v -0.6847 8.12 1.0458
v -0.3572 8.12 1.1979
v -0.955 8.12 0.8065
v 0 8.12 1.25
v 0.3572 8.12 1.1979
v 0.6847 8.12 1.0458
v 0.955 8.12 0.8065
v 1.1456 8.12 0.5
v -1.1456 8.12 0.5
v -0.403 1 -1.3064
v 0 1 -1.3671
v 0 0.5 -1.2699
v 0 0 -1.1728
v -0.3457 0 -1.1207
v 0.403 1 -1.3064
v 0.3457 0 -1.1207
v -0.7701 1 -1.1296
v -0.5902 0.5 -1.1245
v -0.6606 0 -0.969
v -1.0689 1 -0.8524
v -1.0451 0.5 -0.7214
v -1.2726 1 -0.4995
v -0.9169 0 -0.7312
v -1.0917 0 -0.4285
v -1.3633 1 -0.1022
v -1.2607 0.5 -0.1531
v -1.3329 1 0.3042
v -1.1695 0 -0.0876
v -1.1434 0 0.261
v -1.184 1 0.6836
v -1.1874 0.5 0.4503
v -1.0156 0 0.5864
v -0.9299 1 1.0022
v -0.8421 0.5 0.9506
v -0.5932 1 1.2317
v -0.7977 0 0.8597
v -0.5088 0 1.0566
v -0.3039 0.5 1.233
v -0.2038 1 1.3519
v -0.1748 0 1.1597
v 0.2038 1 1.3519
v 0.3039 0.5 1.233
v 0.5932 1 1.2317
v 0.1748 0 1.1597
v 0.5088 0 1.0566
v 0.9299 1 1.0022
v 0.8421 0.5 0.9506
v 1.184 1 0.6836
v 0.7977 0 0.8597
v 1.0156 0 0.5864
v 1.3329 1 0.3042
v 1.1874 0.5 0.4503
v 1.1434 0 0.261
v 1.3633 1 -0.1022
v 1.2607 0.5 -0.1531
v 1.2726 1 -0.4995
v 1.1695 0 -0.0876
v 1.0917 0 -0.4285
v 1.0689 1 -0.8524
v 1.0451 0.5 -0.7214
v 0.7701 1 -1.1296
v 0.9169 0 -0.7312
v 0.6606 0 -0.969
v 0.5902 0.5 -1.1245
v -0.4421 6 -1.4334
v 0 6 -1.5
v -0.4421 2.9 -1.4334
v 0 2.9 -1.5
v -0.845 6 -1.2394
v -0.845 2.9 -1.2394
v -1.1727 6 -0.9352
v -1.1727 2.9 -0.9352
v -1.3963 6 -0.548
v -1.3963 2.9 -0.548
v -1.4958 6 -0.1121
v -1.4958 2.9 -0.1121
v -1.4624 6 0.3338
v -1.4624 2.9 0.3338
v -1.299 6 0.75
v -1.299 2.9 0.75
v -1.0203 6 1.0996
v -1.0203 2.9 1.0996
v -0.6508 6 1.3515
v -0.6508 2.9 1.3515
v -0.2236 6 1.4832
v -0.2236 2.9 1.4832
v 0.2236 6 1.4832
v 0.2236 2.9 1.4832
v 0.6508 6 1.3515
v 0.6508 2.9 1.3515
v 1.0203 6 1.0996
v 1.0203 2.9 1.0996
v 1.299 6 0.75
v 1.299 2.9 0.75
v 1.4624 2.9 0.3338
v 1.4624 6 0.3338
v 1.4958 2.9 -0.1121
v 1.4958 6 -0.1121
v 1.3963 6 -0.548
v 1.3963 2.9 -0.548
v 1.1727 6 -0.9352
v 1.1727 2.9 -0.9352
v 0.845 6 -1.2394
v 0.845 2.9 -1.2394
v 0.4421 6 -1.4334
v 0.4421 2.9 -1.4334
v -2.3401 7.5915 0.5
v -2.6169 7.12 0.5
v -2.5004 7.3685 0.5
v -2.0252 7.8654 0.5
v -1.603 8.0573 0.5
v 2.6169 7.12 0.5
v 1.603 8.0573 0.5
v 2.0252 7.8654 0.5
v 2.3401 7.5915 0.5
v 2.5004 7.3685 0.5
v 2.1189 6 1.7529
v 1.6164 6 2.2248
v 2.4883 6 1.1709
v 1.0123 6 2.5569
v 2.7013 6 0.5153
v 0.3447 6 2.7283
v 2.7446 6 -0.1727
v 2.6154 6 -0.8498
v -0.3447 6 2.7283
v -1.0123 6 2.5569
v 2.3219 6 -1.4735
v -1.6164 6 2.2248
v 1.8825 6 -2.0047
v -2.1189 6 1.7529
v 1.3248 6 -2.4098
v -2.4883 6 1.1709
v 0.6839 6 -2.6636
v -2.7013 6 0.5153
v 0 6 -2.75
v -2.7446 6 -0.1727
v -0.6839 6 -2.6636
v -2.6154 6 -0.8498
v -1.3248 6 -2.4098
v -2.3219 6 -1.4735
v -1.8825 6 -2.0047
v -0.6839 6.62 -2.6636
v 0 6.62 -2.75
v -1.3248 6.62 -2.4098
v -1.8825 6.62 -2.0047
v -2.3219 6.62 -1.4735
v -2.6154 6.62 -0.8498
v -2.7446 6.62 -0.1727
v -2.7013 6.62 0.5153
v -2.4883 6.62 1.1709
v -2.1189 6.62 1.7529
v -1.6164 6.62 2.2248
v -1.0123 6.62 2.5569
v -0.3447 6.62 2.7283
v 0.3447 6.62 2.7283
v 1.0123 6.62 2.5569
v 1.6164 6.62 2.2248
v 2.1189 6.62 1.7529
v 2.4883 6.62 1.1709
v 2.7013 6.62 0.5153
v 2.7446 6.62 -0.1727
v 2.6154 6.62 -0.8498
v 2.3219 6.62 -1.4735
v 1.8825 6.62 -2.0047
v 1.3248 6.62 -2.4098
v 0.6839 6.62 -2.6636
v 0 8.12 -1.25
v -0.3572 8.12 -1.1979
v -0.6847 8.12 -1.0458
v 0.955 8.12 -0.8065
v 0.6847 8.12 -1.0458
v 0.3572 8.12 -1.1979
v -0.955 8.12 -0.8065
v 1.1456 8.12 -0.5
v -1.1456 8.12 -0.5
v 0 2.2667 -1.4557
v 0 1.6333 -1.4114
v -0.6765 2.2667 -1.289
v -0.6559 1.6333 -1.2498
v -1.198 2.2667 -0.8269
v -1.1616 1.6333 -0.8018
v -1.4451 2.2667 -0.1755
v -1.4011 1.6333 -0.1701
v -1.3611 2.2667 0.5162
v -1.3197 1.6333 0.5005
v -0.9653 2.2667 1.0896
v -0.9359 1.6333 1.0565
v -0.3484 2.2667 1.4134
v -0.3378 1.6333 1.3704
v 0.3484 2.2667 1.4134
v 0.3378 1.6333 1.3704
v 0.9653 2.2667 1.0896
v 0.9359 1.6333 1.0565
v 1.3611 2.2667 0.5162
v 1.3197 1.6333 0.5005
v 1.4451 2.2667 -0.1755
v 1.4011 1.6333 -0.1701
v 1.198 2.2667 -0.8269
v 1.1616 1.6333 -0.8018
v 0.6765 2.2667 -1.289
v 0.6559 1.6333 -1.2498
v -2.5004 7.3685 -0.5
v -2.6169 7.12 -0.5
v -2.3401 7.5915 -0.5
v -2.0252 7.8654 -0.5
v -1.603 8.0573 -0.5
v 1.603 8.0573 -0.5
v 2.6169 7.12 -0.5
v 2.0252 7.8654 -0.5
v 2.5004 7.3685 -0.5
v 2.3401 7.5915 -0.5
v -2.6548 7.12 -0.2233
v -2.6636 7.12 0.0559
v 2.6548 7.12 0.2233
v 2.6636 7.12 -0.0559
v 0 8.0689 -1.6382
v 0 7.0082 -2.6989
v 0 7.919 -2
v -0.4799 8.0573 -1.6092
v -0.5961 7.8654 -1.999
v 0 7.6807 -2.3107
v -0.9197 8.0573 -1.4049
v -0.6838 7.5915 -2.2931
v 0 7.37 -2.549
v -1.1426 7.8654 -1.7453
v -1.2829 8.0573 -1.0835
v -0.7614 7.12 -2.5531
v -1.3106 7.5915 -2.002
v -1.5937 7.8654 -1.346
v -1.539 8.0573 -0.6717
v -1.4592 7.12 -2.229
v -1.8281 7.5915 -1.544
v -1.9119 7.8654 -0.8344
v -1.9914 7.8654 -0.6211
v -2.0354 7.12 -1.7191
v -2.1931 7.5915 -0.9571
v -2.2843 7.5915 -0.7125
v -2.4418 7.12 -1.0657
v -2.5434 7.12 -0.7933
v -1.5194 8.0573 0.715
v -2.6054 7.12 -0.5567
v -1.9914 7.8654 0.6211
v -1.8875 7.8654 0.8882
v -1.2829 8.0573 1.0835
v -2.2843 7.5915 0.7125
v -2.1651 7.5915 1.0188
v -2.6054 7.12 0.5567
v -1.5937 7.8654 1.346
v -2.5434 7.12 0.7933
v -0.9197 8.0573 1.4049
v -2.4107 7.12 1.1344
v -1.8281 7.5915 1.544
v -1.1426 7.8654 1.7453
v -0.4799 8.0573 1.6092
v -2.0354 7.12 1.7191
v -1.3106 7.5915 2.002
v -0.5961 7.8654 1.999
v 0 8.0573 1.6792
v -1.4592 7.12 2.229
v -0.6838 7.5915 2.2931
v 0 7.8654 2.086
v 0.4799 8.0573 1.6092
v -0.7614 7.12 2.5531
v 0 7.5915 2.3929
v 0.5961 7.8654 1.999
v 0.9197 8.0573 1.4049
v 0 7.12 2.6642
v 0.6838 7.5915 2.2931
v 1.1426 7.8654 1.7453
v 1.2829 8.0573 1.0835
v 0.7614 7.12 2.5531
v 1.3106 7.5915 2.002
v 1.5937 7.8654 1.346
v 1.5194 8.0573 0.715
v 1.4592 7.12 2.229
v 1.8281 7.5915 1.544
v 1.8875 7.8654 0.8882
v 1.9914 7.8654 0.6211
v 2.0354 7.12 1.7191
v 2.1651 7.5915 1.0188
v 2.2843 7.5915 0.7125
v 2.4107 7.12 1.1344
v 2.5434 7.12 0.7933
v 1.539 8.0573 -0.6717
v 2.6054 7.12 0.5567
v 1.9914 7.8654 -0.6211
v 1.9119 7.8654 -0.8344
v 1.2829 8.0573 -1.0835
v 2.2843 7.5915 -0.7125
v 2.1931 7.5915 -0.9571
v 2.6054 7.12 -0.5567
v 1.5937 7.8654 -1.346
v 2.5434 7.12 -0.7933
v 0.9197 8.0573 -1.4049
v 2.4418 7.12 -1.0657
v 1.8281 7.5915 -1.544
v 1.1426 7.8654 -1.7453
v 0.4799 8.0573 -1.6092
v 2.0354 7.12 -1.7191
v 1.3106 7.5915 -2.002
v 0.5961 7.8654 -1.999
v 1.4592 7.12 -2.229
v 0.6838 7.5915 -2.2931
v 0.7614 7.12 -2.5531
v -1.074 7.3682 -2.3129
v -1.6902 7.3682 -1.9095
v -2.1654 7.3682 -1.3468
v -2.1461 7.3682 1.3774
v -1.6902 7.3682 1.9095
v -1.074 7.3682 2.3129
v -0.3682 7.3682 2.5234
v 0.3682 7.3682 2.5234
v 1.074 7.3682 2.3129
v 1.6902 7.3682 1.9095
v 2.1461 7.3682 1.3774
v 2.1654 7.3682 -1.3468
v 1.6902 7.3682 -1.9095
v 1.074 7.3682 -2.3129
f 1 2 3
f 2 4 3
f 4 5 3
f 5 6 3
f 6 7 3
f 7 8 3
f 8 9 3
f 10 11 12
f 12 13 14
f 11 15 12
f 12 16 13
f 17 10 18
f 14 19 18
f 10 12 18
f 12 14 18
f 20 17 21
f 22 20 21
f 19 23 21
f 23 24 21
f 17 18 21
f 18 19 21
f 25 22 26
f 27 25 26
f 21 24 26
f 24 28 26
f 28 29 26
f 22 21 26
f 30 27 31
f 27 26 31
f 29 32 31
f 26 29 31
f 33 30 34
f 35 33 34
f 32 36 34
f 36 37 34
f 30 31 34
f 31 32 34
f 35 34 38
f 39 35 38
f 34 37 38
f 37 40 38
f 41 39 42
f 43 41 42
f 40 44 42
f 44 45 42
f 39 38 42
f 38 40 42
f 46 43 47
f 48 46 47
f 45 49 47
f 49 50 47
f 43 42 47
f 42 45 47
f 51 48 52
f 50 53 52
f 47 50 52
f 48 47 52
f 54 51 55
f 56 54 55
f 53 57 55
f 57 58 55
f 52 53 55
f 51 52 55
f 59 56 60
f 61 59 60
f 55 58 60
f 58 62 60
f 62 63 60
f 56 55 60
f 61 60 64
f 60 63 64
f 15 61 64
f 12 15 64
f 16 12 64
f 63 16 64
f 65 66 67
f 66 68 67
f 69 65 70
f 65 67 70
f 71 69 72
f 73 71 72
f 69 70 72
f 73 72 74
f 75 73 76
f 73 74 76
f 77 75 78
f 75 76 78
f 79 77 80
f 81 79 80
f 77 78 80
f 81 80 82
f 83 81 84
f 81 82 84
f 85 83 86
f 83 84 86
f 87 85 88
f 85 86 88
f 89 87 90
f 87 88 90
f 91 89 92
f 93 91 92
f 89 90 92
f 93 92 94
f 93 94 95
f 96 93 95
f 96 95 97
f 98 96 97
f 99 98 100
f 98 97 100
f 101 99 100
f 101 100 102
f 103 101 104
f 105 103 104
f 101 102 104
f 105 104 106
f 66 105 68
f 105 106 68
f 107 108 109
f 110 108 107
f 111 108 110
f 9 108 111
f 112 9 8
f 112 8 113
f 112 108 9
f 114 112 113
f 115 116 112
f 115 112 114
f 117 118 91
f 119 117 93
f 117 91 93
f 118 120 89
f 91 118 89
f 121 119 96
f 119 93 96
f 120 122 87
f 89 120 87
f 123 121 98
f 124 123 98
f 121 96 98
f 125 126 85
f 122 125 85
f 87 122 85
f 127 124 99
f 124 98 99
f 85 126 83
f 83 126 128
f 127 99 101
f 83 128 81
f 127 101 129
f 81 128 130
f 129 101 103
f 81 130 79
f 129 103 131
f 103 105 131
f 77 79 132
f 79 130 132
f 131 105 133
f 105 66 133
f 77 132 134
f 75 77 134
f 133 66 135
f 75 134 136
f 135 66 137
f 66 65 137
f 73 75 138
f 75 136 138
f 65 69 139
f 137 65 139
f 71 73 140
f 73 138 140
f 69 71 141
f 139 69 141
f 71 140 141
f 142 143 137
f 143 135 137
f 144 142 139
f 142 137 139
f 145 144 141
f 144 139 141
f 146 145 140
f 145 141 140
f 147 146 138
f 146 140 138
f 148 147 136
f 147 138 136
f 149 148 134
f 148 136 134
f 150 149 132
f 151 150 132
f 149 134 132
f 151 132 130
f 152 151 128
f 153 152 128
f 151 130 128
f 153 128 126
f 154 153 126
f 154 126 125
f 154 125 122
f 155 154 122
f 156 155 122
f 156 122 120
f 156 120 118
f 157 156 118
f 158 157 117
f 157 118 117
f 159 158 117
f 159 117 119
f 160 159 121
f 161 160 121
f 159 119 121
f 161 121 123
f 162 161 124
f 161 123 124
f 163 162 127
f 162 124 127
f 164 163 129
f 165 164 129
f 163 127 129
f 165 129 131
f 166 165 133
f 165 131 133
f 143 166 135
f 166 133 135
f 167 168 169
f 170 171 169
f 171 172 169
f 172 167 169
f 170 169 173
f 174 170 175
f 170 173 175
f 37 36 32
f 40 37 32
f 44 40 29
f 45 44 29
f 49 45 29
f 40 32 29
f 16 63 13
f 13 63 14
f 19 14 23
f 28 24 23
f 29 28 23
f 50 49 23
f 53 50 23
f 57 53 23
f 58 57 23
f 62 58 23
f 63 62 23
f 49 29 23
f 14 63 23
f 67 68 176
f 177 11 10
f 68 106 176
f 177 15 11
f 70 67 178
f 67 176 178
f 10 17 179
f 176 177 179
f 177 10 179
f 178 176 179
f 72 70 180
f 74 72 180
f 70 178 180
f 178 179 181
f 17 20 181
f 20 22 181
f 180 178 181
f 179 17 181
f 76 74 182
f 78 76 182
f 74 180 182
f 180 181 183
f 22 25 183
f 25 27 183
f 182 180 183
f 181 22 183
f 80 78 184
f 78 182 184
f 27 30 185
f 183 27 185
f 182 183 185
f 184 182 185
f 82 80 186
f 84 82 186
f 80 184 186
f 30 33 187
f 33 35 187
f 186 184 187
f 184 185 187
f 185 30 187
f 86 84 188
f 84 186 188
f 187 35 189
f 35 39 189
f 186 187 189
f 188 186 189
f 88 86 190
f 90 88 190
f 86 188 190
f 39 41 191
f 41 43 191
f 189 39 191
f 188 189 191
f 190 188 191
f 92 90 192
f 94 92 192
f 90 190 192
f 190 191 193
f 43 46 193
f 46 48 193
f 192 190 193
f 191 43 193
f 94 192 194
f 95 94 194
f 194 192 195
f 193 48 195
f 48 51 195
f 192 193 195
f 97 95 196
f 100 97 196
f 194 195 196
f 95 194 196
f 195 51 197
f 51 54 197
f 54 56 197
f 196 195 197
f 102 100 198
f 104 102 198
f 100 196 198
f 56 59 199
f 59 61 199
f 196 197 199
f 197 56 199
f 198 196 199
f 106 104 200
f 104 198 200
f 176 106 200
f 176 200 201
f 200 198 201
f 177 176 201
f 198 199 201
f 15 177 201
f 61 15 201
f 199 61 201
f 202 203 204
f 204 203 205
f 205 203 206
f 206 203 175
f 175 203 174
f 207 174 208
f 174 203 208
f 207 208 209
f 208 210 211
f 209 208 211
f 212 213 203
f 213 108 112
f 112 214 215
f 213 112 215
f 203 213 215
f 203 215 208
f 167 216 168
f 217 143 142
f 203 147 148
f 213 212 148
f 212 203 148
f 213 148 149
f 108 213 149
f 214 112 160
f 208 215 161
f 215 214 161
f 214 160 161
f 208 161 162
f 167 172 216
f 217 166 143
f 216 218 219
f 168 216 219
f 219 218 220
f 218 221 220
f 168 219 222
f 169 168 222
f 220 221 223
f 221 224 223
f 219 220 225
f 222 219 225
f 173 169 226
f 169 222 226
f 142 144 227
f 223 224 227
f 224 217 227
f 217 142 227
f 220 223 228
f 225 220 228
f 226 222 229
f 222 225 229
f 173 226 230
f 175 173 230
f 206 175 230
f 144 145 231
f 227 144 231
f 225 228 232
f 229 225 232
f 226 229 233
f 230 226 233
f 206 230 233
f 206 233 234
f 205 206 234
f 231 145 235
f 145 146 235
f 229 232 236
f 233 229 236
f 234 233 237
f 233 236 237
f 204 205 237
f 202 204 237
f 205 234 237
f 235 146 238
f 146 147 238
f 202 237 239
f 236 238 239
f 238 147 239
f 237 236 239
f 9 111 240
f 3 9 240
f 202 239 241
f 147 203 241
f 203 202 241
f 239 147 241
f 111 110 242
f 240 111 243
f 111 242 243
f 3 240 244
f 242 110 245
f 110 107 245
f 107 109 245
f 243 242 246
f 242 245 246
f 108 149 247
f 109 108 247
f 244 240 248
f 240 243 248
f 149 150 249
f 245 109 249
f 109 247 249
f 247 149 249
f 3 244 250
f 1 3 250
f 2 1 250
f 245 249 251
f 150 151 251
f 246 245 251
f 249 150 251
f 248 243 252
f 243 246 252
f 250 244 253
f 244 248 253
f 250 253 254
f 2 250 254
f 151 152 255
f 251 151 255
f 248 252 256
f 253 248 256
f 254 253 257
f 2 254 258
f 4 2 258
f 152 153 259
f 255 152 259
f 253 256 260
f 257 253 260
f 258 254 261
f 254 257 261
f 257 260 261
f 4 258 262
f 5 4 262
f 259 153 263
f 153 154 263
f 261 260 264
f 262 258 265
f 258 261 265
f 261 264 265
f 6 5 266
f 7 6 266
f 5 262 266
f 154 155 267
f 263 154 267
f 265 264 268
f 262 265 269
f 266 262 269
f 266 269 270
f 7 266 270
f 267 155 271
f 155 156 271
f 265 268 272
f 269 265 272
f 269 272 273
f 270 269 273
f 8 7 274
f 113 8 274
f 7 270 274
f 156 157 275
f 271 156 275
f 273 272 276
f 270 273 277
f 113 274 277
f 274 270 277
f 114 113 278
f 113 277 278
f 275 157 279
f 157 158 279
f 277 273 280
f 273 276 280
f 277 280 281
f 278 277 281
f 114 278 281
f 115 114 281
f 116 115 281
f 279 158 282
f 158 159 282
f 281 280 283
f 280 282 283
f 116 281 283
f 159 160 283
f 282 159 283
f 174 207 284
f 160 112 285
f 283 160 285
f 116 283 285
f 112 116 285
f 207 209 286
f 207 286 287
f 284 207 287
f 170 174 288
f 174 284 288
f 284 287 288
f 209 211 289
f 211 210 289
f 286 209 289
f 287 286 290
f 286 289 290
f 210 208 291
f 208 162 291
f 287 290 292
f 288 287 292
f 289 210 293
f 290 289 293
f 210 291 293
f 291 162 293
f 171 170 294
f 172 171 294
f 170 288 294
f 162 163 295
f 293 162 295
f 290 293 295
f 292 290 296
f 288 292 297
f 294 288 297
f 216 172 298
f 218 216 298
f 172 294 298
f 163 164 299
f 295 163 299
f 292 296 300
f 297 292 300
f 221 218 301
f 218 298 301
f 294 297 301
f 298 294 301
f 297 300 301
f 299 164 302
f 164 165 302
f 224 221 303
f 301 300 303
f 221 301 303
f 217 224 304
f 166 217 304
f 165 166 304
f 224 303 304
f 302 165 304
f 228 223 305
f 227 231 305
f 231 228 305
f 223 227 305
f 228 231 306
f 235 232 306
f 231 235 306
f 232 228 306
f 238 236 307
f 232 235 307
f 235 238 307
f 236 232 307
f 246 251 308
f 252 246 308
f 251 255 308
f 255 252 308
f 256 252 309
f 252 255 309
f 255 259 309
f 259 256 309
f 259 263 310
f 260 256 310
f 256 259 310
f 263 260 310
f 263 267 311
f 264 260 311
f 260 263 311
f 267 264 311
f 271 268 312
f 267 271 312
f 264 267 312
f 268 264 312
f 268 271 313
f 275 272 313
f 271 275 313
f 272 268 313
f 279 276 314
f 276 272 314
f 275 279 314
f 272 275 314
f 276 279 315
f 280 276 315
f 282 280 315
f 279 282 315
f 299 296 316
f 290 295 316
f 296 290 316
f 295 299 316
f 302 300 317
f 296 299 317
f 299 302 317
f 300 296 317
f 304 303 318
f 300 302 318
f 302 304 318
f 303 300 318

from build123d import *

# Parameters (mm, degrees)
SKETCH_2_W          = 1
SKETCH_2_H          = 1
CUT_EXTRUDE_1_DEPTH = 5


with BuildPart() as part:
    # Эскиз1 → Повернуть1 (revolve)
    with BuildSketch(Plane.XY, mode=Mode.PRIVATE) as revolve_1_sk:
        with BuildLine():
            Line((0, 0), (0, 8.12))
            Line((0, 8.12), (1.25, 8.12))
            ThreePointArc((1.25, 8.12), (2.310660172, 7.680660172), (2.75, 6.62))
            Line((2.75, 6.62), (2.75, 6))
            Line((2.75, 6), (1.5, 6))
            Line((1.5, 6), (1.5, 2.9))
            Line((1.5, 2.9), (1.367139057, 1))
            Line((1.367139057, 1), (1.172758748, 0))
            Line((1.172758748, 0), (0, 0))
        make_face()
    revolve(revolve_1_sk.sketch.rotate(Axis((0, 0, 0), (0, 1, 0)), 90), axis=Axis((0, 0, 0), (0, 1, 0)))

    # Эскиз2 → Вырез-Вытянуть1 (cut, symmetric)
    with BuildSketch(Plane(origin=(0, 0, 0), x_dir=(0, 0, -1), z_dir=(1, 0, 0))):
        with Locations((0, 7.62)):
            Rectangle(SKETCH_2_W, SKETCH_2_H)
    extrude(amount=CUT_EXTRUDE_1_DEPTH, both=True, mode=Mode.SUBTRACT)


solid = part.part
